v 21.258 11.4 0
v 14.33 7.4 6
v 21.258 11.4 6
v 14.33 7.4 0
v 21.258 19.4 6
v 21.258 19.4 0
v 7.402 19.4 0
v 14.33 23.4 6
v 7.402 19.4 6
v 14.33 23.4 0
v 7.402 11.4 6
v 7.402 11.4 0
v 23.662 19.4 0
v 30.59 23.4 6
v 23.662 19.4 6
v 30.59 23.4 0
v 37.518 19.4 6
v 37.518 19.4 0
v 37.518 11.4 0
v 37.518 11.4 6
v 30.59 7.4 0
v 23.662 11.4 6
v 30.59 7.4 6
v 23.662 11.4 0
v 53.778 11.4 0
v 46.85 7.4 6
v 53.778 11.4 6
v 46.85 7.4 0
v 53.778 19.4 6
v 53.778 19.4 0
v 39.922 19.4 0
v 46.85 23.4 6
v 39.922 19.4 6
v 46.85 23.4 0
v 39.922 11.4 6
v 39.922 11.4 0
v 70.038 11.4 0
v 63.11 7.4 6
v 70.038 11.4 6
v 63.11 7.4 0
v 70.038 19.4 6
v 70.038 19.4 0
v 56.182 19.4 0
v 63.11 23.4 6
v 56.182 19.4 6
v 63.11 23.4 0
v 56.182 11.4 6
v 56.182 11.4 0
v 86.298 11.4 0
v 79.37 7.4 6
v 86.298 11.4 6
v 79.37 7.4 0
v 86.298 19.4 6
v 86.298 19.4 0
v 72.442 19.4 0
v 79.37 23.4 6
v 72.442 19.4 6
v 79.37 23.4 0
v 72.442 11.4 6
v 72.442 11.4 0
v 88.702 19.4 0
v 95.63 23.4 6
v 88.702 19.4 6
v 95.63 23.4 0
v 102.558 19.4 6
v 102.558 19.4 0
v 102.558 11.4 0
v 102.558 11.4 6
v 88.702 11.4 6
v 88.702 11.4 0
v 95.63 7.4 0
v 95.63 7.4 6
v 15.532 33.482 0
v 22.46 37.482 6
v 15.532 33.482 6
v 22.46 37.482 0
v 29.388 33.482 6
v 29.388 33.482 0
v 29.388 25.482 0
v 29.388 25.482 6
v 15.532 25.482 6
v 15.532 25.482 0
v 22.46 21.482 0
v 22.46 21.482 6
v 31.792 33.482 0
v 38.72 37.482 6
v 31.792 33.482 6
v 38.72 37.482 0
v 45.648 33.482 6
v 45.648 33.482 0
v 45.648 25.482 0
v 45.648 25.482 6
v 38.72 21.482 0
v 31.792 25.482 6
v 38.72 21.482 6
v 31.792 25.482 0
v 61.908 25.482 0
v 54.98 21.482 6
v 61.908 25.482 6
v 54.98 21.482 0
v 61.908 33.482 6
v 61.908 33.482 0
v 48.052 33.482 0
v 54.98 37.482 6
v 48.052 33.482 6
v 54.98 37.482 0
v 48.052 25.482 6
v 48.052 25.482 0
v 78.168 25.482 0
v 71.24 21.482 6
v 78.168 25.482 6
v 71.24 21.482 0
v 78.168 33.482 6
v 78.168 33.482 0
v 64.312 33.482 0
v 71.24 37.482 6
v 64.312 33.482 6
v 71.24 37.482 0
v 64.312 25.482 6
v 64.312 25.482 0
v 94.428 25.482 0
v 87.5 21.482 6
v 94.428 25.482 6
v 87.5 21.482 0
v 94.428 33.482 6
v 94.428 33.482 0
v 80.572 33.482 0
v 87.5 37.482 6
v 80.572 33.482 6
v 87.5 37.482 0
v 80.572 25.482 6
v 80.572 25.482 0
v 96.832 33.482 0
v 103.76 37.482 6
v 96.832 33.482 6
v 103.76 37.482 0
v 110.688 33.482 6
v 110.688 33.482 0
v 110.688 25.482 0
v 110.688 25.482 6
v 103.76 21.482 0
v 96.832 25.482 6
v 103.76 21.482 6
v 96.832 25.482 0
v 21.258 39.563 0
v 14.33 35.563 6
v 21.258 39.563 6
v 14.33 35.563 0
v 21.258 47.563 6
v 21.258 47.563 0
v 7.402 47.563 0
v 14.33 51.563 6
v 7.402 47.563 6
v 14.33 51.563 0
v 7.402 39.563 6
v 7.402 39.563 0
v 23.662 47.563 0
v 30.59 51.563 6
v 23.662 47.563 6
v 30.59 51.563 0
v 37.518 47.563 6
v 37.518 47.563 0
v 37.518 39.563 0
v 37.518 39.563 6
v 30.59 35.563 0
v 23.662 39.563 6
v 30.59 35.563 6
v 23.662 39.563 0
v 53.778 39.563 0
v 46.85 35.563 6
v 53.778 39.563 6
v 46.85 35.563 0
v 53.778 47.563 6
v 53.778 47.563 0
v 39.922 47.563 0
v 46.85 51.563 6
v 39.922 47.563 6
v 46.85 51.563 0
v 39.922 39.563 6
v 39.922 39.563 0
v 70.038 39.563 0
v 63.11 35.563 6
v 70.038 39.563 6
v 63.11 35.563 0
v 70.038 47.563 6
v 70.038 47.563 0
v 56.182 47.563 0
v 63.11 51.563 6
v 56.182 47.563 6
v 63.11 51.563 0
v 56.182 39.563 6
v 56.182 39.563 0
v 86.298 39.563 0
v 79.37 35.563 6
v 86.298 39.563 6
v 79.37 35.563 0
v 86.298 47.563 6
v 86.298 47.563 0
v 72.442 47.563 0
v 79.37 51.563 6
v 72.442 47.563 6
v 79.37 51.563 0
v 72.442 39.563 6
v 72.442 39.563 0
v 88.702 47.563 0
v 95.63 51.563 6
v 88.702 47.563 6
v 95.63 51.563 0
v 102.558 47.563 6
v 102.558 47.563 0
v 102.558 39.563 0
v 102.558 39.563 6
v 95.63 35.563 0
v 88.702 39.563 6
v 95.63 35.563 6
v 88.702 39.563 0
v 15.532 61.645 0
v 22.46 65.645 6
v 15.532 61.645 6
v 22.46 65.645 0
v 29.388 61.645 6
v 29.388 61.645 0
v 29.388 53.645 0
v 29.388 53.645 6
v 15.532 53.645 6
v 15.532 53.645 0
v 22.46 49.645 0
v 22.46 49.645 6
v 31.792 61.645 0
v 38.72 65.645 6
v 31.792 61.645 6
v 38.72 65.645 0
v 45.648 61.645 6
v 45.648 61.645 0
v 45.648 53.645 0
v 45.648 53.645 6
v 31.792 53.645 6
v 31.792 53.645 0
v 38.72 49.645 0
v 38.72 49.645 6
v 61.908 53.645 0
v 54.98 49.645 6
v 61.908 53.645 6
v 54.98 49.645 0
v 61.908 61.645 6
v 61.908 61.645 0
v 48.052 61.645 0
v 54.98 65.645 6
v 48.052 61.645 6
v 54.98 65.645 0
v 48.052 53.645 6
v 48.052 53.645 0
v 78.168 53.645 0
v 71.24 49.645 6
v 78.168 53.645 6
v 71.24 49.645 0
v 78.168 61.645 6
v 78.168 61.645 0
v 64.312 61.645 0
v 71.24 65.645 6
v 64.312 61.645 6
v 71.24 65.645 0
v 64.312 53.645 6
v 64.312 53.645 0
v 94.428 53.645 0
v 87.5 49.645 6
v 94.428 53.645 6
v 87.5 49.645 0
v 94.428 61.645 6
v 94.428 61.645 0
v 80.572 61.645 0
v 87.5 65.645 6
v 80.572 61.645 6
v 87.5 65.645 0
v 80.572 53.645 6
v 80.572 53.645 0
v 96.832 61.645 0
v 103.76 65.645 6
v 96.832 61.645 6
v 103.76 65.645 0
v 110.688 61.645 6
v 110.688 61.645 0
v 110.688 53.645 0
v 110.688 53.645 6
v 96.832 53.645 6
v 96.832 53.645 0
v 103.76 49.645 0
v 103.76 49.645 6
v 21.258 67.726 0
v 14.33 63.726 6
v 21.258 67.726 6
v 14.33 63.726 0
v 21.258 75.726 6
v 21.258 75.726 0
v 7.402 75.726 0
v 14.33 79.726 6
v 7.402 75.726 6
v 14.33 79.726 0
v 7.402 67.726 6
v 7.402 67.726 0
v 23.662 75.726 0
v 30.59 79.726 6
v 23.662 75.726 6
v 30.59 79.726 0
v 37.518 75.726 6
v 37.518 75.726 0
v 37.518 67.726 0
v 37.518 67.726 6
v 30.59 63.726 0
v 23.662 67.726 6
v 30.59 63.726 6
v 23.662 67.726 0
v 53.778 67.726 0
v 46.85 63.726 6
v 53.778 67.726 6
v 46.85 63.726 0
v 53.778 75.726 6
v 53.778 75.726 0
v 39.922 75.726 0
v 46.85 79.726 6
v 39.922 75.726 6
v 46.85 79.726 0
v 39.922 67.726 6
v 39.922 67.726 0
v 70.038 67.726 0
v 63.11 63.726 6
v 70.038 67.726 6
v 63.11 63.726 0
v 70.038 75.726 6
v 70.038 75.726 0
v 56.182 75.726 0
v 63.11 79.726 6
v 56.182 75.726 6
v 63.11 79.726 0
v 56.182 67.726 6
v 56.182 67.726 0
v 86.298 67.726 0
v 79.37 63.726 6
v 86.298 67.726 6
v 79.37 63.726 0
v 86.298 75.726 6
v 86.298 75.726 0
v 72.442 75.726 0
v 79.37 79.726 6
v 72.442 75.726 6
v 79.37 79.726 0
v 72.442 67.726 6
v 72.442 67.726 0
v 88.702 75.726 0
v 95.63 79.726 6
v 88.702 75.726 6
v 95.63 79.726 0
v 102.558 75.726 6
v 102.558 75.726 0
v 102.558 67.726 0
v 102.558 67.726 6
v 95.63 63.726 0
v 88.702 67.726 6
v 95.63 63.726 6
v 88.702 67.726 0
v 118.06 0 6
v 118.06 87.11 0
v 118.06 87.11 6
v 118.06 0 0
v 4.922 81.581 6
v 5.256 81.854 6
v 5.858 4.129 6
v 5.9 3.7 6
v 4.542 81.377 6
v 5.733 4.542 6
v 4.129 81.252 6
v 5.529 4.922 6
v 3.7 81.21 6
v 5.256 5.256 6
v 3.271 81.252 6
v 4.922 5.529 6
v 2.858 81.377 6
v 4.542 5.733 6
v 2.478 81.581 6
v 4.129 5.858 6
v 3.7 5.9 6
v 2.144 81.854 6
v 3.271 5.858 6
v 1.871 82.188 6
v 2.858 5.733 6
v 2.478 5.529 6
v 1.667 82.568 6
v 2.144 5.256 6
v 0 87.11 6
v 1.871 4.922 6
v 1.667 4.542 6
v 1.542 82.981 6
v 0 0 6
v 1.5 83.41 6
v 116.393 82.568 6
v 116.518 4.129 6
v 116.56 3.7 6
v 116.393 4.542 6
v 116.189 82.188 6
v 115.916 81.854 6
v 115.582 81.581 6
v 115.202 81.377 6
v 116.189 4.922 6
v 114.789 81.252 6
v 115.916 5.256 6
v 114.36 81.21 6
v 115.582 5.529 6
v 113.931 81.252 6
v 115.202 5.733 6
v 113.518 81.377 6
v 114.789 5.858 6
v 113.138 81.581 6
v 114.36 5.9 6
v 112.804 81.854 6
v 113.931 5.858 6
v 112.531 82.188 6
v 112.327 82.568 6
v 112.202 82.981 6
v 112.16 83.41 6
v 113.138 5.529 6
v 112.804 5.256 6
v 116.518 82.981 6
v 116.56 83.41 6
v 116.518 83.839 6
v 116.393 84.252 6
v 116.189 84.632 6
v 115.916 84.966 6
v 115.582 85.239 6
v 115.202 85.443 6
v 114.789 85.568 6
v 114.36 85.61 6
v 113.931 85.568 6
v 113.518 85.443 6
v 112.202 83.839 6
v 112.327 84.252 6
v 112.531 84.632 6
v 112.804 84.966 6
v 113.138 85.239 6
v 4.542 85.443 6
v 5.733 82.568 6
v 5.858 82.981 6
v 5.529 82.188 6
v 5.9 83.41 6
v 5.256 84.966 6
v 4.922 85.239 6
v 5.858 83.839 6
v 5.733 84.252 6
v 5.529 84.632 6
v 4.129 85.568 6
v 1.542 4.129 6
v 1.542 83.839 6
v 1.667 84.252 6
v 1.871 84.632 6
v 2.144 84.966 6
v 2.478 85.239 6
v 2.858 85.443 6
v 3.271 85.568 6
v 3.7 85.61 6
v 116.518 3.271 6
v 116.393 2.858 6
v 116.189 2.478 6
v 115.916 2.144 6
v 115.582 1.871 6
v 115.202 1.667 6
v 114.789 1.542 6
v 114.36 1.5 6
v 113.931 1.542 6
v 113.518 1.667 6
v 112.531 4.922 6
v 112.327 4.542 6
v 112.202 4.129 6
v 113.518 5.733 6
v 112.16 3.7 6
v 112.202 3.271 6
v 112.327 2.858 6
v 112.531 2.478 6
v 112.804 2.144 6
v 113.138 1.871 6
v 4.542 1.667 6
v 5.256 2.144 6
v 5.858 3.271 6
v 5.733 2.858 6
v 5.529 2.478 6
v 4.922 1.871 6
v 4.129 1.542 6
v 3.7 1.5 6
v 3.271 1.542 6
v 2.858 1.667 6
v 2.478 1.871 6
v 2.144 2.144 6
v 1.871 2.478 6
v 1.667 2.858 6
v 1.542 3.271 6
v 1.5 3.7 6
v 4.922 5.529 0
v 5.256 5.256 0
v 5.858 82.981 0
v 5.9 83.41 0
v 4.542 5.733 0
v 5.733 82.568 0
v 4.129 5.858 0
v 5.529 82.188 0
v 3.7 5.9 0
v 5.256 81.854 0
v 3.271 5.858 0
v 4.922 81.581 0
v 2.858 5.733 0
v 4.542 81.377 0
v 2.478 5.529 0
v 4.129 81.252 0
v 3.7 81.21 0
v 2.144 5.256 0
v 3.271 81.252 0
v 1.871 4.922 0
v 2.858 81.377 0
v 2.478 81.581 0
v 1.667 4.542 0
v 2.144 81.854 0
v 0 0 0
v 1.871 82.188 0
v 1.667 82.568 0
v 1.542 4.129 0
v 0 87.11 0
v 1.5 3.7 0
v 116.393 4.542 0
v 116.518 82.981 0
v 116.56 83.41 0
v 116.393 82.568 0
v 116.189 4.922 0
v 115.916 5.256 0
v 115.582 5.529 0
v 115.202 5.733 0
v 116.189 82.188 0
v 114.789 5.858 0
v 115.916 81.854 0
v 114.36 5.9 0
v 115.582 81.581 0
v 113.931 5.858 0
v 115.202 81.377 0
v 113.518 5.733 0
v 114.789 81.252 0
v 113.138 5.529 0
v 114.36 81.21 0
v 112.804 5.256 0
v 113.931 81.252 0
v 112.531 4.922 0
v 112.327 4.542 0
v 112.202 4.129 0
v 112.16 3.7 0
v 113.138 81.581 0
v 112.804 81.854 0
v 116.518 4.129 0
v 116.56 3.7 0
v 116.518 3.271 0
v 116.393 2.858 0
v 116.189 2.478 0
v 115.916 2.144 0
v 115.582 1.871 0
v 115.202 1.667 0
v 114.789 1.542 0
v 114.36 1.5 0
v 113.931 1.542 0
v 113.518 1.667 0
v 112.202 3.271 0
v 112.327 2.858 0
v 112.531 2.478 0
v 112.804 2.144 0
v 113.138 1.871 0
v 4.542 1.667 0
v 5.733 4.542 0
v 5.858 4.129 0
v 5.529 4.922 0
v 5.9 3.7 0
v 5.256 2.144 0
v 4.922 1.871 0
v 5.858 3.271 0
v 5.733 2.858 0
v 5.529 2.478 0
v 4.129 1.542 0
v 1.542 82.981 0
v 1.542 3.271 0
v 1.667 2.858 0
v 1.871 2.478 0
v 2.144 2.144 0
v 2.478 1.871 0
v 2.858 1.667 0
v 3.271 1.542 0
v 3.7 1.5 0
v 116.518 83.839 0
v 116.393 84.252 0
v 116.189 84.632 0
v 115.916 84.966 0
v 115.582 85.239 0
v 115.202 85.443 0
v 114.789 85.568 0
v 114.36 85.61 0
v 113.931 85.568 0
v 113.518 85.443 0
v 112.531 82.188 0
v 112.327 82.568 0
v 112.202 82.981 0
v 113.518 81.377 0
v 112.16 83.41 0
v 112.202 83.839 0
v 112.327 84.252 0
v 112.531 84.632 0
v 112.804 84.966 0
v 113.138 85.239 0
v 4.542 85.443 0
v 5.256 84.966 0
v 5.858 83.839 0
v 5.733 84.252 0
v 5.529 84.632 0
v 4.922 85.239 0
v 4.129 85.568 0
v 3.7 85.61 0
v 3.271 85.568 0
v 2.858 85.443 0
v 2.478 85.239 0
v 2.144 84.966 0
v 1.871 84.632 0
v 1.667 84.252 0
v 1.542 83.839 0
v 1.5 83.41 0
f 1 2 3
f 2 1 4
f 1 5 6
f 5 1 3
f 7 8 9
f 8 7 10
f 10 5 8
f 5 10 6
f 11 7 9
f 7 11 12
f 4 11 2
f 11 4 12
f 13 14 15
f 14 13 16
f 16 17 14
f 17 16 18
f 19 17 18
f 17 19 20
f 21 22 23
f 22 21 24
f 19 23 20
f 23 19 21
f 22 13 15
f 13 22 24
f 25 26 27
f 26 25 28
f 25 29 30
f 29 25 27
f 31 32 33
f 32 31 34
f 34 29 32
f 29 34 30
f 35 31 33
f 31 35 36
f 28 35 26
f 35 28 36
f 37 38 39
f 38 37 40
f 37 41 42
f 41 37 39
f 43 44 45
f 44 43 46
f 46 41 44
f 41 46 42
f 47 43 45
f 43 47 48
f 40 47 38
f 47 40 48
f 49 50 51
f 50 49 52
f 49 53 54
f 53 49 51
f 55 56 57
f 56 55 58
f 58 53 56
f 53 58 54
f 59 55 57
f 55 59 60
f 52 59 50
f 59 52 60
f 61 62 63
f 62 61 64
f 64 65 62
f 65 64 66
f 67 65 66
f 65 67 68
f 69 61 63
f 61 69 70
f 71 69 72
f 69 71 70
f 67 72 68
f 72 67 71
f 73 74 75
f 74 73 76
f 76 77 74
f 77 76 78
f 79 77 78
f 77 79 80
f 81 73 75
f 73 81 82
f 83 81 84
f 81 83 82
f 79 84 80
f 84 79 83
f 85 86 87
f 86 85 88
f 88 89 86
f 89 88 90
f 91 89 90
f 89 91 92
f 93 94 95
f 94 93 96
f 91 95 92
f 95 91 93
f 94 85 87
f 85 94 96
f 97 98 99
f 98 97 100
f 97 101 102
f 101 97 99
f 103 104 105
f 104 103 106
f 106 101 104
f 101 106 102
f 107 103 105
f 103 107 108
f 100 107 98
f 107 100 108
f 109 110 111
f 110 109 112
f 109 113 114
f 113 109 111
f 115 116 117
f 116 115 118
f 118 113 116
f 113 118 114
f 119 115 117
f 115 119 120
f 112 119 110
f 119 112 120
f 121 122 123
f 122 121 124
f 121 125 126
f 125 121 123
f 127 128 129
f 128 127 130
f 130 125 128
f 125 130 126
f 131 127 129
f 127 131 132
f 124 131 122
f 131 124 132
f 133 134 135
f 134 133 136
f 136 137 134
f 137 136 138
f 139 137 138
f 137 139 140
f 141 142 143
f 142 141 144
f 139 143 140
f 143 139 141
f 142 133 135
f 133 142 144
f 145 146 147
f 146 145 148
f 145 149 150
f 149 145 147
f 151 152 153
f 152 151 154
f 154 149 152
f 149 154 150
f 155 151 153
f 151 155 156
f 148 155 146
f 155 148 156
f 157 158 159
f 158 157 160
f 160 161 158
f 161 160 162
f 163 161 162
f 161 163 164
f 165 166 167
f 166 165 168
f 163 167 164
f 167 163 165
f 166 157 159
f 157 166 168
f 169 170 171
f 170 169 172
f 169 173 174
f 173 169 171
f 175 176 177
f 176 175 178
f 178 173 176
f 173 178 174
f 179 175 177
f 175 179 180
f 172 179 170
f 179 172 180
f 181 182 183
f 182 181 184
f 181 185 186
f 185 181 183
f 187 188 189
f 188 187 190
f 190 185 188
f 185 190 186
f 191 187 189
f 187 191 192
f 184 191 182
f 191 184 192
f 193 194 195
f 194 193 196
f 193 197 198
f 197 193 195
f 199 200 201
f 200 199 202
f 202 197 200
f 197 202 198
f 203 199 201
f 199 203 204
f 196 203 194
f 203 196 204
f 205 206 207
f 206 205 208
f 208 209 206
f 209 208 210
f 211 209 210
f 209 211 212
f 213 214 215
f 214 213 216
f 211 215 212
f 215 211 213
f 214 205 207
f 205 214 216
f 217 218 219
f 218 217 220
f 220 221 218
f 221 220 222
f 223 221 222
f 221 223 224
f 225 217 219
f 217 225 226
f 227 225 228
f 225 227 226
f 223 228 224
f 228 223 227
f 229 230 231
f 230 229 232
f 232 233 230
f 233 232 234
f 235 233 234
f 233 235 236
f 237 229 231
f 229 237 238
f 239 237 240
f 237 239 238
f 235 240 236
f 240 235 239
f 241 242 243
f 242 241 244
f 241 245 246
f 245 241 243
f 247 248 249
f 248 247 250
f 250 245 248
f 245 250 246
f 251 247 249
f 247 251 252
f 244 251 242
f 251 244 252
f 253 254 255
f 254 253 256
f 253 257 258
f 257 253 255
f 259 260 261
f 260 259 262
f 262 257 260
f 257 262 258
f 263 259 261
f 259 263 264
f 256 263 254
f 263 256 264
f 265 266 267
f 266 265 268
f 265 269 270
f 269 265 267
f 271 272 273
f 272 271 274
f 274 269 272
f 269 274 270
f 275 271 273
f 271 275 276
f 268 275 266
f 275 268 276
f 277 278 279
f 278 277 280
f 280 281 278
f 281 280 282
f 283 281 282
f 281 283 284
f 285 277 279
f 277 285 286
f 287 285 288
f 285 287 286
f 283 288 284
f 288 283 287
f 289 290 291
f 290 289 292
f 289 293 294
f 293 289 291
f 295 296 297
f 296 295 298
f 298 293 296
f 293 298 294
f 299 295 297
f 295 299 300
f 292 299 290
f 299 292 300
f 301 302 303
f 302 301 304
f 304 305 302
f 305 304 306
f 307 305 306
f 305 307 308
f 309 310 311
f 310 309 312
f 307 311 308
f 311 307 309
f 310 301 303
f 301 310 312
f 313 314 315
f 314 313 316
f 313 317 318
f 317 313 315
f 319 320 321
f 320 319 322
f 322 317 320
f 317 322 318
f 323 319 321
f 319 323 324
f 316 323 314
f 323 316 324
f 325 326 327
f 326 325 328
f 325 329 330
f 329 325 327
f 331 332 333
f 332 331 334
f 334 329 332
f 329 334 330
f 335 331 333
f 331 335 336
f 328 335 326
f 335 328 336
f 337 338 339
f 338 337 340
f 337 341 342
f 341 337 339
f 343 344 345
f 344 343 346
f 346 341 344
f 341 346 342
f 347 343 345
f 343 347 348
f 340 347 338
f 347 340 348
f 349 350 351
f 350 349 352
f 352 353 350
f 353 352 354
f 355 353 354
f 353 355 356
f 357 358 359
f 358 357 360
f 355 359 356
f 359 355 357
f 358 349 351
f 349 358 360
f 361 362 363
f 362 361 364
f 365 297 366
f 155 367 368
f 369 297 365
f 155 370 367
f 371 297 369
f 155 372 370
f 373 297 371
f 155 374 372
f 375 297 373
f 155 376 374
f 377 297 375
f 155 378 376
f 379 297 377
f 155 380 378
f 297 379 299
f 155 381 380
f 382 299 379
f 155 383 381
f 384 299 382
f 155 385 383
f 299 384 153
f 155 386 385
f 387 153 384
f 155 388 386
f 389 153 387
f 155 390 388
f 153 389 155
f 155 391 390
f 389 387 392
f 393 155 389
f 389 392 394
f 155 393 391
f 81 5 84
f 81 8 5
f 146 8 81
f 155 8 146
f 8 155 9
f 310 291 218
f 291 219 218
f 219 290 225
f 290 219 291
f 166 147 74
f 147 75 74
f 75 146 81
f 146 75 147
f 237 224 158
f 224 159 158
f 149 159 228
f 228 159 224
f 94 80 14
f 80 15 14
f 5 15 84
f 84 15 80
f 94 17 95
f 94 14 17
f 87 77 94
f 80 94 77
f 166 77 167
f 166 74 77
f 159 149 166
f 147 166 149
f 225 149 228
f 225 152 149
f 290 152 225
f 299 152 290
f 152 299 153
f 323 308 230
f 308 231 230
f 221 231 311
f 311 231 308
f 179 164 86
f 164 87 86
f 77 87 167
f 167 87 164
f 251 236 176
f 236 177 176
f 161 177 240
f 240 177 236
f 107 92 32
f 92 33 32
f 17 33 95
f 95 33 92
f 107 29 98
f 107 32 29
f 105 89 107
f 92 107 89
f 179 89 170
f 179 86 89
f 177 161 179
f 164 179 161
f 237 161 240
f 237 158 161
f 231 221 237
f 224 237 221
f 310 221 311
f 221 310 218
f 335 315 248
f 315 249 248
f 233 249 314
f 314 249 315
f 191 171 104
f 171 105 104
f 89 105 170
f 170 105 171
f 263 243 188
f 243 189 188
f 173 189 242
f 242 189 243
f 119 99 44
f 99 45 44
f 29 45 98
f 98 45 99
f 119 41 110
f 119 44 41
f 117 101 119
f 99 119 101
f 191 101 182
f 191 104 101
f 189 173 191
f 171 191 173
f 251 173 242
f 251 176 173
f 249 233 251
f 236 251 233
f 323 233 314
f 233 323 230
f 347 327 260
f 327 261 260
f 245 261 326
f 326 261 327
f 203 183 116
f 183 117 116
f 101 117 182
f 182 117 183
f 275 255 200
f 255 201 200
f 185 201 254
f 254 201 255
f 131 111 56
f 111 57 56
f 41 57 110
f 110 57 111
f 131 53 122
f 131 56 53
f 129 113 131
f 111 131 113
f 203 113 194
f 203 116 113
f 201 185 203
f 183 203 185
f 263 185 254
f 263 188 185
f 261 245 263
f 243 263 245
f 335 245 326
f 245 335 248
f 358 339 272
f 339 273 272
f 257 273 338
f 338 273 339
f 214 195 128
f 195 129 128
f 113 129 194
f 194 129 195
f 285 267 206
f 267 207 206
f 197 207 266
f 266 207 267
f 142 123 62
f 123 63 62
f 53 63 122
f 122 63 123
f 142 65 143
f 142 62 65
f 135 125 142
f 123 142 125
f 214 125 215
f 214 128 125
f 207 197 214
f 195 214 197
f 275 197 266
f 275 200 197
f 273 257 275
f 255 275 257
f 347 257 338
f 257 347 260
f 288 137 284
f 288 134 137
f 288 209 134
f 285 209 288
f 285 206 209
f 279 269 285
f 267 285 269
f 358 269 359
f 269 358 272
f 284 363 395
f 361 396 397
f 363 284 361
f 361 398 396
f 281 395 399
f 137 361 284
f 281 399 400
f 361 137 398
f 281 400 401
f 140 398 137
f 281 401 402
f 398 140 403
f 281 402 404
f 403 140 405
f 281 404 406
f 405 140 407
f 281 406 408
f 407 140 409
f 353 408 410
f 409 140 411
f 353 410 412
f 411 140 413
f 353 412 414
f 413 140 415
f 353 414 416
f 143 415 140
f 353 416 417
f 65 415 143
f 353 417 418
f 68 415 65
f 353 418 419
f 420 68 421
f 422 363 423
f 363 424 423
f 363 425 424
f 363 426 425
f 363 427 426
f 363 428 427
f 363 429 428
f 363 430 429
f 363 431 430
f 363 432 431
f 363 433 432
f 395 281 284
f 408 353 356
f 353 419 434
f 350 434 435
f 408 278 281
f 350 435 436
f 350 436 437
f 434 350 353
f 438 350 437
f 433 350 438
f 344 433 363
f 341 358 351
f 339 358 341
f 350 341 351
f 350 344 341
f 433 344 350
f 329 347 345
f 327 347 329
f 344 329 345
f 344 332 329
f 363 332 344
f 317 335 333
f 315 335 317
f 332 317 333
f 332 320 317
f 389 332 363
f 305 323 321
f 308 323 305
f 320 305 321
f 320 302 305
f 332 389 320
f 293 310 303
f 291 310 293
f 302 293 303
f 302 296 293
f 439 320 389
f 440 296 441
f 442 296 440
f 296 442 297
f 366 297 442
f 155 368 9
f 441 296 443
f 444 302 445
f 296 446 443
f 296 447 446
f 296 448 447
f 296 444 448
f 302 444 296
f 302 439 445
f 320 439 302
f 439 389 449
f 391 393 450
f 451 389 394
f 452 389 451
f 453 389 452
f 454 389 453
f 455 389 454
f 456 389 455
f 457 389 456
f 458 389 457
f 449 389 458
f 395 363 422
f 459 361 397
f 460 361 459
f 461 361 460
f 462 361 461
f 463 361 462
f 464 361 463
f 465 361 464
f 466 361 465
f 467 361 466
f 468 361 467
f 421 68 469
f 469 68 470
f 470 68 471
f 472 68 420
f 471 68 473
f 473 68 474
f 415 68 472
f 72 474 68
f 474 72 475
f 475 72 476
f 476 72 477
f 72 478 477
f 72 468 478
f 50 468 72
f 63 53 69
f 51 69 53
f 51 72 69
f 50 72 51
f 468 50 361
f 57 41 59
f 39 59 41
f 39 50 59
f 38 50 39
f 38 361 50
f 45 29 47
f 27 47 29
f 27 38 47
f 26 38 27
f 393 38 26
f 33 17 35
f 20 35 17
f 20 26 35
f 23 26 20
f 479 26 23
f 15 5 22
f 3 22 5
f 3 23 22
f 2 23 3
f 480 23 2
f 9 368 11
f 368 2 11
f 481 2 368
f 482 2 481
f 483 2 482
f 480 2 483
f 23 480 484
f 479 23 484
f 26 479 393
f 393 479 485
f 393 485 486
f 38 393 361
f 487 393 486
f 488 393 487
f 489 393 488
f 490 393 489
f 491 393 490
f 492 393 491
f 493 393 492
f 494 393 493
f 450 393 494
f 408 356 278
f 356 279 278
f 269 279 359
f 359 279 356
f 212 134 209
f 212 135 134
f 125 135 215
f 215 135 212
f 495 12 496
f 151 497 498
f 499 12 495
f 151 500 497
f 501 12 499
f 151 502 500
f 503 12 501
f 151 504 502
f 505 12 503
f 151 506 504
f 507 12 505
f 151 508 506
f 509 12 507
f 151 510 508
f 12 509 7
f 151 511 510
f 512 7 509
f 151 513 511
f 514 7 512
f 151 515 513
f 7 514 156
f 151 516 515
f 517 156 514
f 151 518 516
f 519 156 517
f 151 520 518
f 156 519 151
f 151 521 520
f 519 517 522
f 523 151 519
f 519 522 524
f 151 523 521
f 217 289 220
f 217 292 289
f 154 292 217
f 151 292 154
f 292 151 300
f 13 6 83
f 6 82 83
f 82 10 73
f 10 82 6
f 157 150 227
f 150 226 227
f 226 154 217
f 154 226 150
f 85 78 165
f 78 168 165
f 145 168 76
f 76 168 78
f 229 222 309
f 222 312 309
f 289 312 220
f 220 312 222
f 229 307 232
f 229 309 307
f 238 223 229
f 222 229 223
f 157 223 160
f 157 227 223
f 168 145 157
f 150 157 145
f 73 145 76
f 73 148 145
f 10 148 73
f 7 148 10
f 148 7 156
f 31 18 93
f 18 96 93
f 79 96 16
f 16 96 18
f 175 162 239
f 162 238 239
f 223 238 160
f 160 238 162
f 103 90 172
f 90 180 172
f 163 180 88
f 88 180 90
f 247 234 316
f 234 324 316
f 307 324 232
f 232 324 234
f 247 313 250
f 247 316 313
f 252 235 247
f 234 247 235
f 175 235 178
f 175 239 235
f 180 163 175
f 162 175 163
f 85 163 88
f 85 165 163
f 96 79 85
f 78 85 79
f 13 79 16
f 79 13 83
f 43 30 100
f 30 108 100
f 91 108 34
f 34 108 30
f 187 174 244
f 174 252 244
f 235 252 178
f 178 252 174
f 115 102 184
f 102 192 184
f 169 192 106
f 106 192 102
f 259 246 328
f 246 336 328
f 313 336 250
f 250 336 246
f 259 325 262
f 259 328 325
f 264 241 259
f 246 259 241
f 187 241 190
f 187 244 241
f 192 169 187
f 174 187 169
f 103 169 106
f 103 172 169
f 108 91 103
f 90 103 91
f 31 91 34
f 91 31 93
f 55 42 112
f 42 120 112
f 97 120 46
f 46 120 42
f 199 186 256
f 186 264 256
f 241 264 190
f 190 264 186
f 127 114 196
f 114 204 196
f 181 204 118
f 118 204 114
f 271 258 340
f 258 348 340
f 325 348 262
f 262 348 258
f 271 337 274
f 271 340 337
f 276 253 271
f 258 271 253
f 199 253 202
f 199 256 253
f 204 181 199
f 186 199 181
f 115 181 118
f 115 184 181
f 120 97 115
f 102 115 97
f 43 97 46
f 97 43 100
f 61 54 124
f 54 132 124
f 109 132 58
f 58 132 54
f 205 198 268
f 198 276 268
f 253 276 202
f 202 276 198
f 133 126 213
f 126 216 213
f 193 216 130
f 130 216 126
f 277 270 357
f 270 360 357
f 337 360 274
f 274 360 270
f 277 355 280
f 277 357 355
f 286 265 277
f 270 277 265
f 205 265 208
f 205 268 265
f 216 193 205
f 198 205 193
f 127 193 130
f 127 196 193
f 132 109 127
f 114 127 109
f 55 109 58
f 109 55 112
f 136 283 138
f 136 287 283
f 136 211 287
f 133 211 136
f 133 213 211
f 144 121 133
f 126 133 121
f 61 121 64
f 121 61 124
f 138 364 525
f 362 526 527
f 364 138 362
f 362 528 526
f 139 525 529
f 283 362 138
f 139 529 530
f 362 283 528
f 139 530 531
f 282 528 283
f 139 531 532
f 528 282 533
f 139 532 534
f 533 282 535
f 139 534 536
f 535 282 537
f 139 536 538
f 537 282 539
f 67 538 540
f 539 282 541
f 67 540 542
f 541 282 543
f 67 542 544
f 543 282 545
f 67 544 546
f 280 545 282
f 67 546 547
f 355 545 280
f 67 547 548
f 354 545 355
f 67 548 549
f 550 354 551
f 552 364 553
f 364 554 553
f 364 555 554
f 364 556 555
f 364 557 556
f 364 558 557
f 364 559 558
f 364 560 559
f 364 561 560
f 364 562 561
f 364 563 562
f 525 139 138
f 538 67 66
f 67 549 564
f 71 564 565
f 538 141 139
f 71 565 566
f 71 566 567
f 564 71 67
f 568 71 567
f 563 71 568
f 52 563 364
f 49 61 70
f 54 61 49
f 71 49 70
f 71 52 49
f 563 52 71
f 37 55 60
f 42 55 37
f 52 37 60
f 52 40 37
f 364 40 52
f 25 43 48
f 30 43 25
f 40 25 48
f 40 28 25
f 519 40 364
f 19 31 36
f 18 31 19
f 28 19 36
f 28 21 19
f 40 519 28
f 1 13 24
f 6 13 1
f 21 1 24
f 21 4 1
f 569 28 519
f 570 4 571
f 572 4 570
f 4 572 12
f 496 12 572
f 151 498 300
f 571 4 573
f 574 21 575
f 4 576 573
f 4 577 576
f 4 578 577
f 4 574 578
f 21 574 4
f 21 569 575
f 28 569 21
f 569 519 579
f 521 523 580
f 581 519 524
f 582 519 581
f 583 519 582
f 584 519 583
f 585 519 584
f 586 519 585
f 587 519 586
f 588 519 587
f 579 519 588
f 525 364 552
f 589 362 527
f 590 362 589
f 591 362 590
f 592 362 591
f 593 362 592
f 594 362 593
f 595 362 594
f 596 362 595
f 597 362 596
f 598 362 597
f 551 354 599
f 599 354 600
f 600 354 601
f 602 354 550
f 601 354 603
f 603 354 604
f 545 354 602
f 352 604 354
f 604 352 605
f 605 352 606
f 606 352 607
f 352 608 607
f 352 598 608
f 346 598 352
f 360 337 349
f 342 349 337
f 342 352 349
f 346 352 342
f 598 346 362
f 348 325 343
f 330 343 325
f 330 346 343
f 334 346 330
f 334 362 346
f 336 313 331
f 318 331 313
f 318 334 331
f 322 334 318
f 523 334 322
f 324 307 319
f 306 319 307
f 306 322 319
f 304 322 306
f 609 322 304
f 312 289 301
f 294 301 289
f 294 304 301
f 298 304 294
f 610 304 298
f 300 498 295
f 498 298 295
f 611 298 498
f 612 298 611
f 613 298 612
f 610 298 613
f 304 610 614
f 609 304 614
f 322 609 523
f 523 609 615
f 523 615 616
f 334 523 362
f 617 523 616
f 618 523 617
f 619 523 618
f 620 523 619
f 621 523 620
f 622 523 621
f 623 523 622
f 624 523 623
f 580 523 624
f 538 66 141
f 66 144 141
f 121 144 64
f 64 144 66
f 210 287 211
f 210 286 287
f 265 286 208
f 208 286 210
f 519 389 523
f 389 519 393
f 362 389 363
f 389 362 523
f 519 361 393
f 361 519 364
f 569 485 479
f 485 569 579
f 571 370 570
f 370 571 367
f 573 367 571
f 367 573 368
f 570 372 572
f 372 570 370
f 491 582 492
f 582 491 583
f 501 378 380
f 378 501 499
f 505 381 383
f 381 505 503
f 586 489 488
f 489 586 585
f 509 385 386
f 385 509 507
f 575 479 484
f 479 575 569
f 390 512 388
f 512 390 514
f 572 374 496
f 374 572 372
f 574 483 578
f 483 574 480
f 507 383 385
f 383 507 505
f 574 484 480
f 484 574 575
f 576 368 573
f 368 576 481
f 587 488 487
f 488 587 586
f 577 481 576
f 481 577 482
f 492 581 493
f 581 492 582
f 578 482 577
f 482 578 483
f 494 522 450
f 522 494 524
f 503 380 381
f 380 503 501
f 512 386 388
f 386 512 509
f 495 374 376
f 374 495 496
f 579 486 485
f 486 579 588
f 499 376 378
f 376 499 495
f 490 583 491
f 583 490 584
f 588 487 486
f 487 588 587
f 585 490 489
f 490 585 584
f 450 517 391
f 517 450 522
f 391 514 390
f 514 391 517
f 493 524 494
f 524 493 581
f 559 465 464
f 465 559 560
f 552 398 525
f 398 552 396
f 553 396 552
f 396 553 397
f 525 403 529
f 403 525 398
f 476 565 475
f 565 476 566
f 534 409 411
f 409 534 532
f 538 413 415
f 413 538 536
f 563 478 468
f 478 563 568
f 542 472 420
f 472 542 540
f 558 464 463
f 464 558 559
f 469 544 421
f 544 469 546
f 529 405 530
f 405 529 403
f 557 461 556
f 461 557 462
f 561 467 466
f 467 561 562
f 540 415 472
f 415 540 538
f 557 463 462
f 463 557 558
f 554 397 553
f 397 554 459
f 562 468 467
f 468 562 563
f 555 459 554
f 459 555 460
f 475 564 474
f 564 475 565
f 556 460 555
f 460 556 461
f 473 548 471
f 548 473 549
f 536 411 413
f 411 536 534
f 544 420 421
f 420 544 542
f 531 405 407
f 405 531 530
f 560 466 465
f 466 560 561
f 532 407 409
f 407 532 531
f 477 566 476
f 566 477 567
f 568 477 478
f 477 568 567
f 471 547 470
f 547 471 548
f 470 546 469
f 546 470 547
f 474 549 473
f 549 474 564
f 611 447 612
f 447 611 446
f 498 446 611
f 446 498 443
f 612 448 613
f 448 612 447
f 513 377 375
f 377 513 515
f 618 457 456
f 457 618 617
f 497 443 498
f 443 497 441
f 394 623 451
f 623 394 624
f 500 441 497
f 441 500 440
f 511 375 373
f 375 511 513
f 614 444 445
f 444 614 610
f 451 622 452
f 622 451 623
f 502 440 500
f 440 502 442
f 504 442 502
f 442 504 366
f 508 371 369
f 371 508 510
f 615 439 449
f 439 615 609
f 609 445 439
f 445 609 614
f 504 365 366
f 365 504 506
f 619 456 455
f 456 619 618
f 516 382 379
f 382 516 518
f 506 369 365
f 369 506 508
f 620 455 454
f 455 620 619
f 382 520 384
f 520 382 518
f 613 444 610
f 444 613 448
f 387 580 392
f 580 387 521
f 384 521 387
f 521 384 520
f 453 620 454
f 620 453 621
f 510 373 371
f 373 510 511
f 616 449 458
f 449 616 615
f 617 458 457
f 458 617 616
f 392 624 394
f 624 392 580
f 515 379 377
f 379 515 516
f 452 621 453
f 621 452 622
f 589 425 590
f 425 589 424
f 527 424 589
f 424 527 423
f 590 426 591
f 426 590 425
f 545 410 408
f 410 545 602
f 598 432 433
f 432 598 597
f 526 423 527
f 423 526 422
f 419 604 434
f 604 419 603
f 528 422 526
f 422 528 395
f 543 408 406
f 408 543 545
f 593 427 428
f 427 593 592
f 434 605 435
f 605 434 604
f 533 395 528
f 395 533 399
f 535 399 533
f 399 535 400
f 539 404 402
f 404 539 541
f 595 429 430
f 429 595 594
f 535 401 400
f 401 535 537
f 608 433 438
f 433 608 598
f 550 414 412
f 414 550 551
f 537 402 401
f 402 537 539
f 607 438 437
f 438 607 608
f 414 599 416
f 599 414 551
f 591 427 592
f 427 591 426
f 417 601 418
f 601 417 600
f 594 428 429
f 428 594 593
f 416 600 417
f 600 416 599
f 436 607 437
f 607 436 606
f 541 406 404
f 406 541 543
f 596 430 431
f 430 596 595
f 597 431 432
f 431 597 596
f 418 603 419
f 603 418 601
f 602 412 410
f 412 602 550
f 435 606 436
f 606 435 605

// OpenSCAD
$fn = 32;

// ----------------------------------------------------------------------
// Honeycomb panel: 118.06 x 87.11 mm, 30 cells of 16 mm
// ----------------------------------------------------------------------

// --- parameters (mm) ---
panel_w = 118.06;         // panel width
panel_d = 87.11;          // panel depth
thick = 6;                // panel thickness
cell_r = 8;               // hex cell circumradius
pitch = 16.26;            // hex cell pitch (centre to centre)
web = 2.4;                // web between the cells
columns = 6;              // columns of cells
rows = 5;                 // rows of cells
cell_count = 30;          // total cells
shift_x = 14.33;          // first cell offset in x
shift_y = 15.4;           // first cell offset in y
mount_d = 4.4;            // corner mounting holes
hole_off = 3.7;           // mounting hole offset from the corners

difference() {
  union() {
    cube([panel_w, panel_d, thick]);
  }
  /* hexagonal cells, point-up, cut right through the plate */
  for (row = [0 : rows - 1]) {
    for (col = [0 : columns - 1]) {
      translate([shift_x + col * pitch + (row % 2) * pitch / 2, shift_y + row * pitch * 0.866025, -2.5]) rotate([0, 0, 30]) cylinder(h = thick + 5, d = 2 * cell_r, $fn = 6);
    }
  }
  /* corner mounting holes, clear of the outer cell web */
  translate([3.7, 3.7, -2.5]) cylinder(h = thick + 5, d = mount_d);
  translate([114.36, 3.7, -2.5]) cylinder(h = thick + 5, d = mount_d);
  translate([3.7, 83.41, -2.5]) cylinder(h = thick + 5, d = mount_d);
  translate([114.36, 83.41, -2.5]) cylinder(h = thick + 5, d = mount_d);
}
